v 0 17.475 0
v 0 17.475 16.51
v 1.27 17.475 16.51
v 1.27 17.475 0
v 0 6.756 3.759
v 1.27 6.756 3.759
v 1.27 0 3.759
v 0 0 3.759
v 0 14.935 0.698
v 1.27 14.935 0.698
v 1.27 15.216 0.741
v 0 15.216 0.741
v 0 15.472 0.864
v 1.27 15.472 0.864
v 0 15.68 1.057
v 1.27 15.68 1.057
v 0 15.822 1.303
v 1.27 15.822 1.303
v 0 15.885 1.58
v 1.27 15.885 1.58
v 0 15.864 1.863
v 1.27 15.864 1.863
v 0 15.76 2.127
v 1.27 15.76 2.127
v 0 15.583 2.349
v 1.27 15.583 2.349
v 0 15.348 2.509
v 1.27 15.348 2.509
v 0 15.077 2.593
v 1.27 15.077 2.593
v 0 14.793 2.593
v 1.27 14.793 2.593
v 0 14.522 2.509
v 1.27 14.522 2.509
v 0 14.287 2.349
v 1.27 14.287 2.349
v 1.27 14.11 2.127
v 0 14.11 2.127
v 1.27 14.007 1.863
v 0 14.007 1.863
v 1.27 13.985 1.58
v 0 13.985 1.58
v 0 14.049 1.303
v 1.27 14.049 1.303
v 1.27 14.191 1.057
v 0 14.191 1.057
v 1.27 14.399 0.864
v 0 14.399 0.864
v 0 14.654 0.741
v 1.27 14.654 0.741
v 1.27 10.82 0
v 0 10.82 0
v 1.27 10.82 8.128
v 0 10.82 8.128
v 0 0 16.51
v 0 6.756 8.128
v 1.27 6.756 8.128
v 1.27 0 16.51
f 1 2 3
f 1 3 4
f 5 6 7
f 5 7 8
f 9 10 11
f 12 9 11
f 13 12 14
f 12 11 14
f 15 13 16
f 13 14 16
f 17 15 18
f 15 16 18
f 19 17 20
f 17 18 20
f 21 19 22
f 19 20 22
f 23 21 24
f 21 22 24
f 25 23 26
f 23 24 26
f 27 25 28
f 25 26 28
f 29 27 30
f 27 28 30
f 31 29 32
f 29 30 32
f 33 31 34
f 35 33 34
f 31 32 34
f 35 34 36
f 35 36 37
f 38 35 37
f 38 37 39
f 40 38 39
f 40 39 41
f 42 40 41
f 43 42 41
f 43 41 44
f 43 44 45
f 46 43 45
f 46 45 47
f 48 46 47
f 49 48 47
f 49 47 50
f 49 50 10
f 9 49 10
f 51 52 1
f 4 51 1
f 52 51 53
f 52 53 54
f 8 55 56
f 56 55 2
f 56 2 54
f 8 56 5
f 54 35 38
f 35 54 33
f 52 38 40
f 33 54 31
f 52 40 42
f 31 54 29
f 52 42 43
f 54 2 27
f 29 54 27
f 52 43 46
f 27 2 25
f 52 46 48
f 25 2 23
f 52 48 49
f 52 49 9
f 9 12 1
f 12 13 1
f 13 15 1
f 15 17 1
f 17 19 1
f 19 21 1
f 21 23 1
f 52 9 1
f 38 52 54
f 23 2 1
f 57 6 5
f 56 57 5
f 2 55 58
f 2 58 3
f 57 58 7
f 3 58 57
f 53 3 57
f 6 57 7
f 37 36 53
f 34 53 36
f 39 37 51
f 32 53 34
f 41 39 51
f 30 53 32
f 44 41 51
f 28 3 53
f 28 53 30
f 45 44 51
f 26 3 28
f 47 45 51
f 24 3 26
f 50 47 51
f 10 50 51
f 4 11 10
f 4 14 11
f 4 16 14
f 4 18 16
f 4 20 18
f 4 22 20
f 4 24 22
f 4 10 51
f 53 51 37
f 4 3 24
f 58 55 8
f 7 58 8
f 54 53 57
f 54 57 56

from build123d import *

# Parameters (mm, degrees)
SKETCH1_W           = 16.51
SKETCH1_H           = 17.4752
BOSS_EXTRUDE1_DEPTH = 1.27
SKETCH2_R           = 0.9525
CUT_EXTRUDE1_DEPTH  = 25.074376732
SKETCH4_W           = 1.27
SKETCH4_H           = 10.8204
CUT_EXTRUDE2_DEPTH  = 3.7592
SKETCH5_W           = 1.27
SKETCH5_H           = 4.064
CUT_EXTRUDE3_DEPTH  = 4.3688


with BuildPart() as part:
    # Sketch1 → Boss-Extrude1 (new body)
    with BuildSketch(Plane(origin=(0, 0, 0), x_dir=(0, 0, -1), z_dir=(1, 0, 0))):
        with Locations((-8.255, 8.7376)):
            Rectangle(SKETCH1_W, SKETCH1_H)
    extrude(amount=BOSS_EXTRUDE1_DEPTH)

    # Sketch2 → Cut-Extrude1 (cut, through all)
    with BuildSketch(Plane(origin=(1.27, 0, 0), x_dir=(0, 0, -1), z_dir=(1, 0, 0))):
        with Locations((-1.651, 14.9352)):
            Circle(SKETCH2_R)
    extrude(amount=-CUT_EXTRUDE1_DEPTH, mode=Mode.SUBTRACT)

    # Sketch4 → Cut-Extrude2 (cut)
    with BuildSketch(Plane(origin=(0, 0, 0), x_dir=(-1, 0, 0), z_dir=(0, 0, -1))):
        with Locations((-0.635, 5.4102)):
            Rectangle(SKETCH4_W, SKETCH4_H)
    extrude(amount=-CUT_EXTRUDE2_DEPTH, mode=Mode.SUBTRACT)

    # Sketch5 → Cut-Extrude3 (cut)
    with BuildSketch(Plane(origin=(0, 0, 3.7592), x_dir=(-1, 0, 0), z_dir=(0, 0, -1))):
        with Locations((-0.635, 8.7884)):
            Rectangle(SKETCH5_W, SKETCH5_H)
    extrude(amount=-CUT_EXTRUDE3_DEPTH, mode=Mode.SUBTRACT)


solid = part.part
